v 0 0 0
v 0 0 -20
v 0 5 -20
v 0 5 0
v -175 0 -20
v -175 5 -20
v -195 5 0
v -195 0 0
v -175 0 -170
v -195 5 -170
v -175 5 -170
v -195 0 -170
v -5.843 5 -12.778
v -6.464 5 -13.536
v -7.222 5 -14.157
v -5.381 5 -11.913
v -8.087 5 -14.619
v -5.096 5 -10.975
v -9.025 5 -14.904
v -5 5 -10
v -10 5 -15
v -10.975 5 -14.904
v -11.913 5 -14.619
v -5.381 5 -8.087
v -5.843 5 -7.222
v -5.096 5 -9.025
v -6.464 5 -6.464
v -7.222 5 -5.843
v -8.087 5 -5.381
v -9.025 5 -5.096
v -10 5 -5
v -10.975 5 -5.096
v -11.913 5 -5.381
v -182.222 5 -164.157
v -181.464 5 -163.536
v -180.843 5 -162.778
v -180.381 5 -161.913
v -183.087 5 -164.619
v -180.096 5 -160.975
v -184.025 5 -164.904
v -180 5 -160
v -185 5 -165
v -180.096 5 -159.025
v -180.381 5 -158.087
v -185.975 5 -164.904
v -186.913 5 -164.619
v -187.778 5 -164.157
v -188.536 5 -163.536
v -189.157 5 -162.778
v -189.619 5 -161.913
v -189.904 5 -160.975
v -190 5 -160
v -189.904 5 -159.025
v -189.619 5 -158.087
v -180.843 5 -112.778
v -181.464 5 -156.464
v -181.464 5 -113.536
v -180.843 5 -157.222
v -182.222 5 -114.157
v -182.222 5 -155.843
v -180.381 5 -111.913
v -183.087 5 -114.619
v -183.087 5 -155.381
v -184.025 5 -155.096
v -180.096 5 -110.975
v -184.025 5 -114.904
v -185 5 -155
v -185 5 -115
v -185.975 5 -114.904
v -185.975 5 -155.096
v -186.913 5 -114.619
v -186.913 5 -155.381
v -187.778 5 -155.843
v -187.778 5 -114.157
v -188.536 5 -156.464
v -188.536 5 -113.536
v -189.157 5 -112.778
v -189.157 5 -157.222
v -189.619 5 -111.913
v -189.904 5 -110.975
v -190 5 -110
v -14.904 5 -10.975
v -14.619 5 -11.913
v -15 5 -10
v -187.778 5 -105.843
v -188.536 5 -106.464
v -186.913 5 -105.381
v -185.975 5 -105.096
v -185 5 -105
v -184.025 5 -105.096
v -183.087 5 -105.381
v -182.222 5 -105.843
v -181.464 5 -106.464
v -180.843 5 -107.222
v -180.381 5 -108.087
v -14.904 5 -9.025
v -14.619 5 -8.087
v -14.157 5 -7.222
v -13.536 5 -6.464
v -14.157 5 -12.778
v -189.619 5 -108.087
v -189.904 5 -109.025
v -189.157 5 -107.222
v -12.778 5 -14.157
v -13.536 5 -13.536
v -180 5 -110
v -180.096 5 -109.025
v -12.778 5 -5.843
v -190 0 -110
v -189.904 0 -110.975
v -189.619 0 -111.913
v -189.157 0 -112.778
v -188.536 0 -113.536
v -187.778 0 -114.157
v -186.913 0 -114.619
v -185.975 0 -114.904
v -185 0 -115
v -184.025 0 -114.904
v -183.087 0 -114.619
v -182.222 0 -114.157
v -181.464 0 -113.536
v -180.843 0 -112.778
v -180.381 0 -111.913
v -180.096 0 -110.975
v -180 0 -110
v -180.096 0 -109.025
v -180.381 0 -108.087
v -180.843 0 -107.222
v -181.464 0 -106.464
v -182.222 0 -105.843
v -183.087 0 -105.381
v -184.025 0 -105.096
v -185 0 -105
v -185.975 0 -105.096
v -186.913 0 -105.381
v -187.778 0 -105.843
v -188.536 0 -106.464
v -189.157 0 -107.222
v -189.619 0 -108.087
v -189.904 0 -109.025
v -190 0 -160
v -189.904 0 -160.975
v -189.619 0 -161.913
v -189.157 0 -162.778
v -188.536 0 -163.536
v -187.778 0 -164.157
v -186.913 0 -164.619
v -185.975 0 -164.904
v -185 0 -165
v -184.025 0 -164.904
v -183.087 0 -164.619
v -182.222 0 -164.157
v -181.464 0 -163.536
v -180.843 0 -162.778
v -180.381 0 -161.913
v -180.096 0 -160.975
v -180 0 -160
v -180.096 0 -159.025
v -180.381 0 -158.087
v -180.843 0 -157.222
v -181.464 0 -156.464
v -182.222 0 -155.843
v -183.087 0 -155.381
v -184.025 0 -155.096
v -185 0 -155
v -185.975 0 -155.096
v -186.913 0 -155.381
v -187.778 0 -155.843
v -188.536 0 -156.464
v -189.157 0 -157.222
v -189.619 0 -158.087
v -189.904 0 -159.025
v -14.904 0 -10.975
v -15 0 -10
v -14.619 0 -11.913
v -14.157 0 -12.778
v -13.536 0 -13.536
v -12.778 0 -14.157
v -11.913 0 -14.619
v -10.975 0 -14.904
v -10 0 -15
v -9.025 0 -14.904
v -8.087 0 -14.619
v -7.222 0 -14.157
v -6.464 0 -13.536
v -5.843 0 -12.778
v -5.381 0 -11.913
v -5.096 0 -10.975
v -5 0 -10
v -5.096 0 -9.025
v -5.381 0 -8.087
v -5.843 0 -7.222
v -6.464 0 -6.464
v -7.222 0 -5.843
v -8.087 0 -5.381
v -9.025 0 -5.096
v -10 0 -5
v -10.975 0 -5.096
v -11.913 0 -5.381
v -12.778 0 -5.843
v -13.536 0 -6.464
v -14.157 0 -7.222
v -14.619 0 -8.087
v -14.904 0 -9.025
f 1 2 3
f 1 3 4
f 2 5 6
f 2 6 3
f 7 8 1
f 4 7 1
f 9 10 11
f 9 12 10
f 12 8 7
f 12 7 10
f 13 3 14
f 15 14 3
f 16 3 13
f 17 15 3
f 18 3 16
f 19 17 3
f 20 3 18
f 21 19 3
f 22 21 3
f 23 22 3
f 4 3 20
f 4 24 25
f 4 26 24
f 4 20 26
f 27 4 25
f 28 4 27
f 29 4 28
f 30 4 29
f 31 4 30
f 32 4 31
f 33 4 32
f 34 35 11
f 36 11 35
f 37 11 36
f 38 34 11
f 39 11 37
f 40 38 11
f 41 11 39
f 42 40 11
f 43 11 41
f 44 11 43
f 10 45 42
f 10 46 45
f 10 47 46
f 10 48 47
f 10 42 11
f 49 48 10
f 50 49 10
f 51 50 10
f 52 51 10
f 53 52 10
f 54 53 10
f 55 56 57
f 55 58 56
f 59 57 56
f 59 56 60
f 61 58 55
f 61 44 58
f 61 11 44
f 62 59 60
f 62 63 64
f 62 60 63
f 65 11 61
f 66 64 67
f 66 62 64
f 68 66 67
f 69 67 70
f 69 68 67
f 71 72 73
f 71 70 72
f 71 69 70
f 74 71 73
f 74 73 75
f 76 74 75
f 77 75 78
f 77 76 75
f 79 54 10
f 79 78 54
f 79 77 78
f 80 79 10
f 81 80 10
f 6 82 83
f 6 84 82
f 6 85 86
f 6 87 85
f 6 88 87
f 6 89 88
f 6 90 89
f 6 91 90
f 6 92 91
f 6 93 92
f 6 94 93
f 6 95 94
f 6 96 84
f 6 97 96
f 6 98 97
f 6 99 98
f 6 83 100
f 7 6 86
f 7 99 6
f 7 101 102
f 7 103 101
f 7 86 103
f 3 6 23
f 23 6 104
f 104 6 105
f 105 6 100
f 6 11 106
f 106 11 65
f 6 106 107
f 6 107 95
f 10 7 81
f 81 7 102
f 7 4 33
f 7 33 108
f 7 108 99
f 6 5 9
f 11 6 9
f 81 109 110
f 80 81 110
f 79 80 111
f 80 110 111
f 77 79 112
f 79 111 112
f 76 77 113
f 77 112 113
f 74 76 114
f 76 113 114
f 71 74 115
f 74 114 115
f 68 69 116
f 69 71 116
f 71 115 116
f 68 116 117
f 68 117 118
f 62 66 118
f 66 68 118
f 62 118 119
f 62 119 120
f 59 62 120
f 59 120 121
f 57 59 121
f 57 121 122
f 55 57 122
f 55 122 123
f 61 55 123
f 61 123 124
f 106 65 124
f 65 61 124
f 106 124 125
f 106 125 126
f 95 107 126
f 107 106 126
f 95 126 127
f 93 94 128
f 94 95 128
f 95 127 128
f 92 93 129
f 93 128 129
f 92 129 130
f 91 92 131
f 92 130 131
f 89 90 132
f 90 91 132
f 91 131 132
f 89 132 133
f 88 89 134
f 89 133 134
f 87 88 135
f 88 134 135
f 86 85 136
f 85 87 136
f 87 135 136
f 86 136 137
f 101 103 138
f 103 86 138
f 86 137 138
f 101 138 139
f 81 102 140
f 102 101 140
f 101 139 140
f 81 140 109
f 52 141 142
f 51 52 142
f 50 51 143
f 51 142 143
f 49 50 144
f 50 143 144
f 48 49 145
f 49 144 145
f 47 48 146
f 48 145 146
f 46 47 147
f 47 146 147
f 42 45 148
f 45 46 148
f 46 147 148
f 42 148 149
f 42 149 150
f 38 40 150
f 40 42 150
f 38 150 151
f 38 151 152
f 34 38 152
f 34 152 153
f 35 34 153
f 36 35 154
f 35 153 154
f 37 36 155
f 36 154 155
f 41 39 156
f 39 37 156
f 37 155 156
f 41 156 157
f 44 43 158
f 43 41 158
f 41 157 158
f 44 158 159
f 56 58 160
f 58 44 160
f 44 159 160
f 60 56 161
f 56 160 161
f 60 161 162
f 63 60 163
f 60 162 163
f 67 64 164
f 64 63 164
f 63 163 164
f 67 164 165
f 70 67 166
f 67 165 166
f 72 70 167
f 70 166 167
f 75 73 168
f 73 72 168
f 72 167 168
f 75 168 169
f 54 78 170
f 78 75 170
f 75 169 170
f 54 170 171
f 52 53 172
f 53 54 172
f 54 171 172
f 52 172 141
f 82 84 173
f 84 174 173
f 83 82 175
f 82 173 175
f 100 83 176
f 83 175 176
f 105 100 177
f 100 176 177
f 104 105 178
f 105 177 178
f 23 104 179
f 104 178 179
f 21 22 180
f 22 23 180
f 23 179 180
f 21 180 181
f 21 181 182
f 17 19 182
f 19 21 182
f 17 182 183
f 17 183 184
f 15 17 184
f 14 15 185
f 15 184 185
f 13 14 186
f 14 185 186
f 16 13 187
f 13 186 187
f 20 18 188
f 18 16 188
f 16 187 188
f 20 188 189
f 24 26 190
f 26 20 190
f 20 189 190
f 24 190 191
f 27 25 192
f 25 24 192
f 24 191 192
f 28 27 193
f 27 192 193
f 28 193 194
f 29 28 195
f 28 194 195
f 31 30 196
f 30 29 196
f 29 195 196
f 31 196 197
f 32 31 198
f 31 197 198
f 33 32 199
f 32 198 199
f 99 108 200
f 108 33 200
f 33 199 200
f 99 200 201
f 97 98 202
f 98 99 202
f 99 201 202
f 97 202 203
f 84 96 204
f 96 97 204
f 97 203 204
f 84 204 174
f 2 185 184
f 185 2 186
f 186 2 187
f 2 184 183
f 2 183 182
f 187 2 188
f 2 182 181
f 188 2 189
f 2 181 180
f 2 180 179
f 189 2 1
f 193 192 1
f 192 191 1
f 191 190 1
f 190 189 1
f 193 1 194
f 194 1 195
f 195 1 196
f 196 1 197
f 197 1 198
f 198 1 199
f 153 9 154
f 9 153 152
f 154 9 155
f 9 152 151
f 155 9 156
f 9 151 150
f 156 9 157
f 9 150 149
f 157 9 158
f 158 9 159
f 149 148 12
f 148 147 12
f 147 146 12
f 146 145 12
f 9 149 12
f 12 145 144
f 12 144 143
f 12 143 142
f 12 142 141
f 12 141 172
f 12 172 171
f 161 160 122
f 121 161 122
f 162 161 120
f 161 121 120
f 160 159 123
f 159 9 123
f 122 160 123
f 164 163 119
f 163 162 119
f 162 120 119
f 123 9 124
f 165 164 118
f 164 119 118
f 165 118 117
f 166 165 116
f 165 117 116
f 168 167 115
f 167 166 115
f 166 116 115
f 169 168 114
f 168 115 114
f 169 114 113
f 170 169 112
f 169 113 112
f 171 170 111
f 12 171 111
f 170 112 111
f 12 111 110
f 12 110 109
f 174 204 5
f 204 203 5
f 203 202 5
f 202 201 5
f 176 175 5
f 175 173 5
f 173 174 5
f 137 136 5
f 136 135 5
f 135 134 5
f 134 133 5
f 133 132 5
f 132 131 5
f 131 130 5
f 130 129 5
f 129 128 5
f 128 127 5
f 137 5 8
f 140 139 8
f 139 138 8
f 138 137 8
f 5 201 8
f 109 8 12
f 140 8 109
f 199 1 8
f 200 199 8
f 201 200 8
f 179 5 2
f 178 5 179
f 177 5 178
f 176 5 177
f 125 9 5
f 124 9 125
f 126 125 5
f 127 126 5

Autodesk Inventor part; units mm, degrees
ref_plane "YZ Plane" through (0, 0, 0) normal (1, 0, 0) x (0, 1, 0)
ref_plane "XZ Plane" through (0, 0, 0) normal (0, 1, 0) x (-1, 0, 0)
ref_plane "XY Plane" through (0, 0, 0) normal (0, 0, 1) x (1, 0, 0)
sketch "スケッチ1" plane through (0, 0, 0) normal (0, 1, 0) x (-1, 0, 0)
  line L0 (234, 0) -> (-39, 0) projected
  line L1 (0, -204) -> (0, 34) projected
  line L2 (0, 0) -> (195, 0)
  line L3 (195, 0) -> (195, -170)
  line L4 (175, -20) -> (0, -20)
  circle A0 centre (10, -10) radius 5
  circle A1 centre (185, -110) radius 5
  line L5 (195, -170) -> (175, -170)
  circle A2 centre (185, -160) radius 5
  line L6 (175, -20) -> (175, -170)
  dimension "d0" = 195
  dimension "d2" = 20
  dimension "d3" = 170
  dimension "d5" = 10
  dimension "d6" = 10
  dimension "d7" = 10
  dimension "d8" = 10
  dimension "d9" = 10
  dimension "d23" = 60
  dimension "d24" = 10
  dimension "d30" = 10
  dimension "d31" = 10
  dimension "d34" = 20
extrude "押し出し4" add sketch "スケッチ1" along normal blind 5
properties part number "rocker" material "アルミニウム 6061"
